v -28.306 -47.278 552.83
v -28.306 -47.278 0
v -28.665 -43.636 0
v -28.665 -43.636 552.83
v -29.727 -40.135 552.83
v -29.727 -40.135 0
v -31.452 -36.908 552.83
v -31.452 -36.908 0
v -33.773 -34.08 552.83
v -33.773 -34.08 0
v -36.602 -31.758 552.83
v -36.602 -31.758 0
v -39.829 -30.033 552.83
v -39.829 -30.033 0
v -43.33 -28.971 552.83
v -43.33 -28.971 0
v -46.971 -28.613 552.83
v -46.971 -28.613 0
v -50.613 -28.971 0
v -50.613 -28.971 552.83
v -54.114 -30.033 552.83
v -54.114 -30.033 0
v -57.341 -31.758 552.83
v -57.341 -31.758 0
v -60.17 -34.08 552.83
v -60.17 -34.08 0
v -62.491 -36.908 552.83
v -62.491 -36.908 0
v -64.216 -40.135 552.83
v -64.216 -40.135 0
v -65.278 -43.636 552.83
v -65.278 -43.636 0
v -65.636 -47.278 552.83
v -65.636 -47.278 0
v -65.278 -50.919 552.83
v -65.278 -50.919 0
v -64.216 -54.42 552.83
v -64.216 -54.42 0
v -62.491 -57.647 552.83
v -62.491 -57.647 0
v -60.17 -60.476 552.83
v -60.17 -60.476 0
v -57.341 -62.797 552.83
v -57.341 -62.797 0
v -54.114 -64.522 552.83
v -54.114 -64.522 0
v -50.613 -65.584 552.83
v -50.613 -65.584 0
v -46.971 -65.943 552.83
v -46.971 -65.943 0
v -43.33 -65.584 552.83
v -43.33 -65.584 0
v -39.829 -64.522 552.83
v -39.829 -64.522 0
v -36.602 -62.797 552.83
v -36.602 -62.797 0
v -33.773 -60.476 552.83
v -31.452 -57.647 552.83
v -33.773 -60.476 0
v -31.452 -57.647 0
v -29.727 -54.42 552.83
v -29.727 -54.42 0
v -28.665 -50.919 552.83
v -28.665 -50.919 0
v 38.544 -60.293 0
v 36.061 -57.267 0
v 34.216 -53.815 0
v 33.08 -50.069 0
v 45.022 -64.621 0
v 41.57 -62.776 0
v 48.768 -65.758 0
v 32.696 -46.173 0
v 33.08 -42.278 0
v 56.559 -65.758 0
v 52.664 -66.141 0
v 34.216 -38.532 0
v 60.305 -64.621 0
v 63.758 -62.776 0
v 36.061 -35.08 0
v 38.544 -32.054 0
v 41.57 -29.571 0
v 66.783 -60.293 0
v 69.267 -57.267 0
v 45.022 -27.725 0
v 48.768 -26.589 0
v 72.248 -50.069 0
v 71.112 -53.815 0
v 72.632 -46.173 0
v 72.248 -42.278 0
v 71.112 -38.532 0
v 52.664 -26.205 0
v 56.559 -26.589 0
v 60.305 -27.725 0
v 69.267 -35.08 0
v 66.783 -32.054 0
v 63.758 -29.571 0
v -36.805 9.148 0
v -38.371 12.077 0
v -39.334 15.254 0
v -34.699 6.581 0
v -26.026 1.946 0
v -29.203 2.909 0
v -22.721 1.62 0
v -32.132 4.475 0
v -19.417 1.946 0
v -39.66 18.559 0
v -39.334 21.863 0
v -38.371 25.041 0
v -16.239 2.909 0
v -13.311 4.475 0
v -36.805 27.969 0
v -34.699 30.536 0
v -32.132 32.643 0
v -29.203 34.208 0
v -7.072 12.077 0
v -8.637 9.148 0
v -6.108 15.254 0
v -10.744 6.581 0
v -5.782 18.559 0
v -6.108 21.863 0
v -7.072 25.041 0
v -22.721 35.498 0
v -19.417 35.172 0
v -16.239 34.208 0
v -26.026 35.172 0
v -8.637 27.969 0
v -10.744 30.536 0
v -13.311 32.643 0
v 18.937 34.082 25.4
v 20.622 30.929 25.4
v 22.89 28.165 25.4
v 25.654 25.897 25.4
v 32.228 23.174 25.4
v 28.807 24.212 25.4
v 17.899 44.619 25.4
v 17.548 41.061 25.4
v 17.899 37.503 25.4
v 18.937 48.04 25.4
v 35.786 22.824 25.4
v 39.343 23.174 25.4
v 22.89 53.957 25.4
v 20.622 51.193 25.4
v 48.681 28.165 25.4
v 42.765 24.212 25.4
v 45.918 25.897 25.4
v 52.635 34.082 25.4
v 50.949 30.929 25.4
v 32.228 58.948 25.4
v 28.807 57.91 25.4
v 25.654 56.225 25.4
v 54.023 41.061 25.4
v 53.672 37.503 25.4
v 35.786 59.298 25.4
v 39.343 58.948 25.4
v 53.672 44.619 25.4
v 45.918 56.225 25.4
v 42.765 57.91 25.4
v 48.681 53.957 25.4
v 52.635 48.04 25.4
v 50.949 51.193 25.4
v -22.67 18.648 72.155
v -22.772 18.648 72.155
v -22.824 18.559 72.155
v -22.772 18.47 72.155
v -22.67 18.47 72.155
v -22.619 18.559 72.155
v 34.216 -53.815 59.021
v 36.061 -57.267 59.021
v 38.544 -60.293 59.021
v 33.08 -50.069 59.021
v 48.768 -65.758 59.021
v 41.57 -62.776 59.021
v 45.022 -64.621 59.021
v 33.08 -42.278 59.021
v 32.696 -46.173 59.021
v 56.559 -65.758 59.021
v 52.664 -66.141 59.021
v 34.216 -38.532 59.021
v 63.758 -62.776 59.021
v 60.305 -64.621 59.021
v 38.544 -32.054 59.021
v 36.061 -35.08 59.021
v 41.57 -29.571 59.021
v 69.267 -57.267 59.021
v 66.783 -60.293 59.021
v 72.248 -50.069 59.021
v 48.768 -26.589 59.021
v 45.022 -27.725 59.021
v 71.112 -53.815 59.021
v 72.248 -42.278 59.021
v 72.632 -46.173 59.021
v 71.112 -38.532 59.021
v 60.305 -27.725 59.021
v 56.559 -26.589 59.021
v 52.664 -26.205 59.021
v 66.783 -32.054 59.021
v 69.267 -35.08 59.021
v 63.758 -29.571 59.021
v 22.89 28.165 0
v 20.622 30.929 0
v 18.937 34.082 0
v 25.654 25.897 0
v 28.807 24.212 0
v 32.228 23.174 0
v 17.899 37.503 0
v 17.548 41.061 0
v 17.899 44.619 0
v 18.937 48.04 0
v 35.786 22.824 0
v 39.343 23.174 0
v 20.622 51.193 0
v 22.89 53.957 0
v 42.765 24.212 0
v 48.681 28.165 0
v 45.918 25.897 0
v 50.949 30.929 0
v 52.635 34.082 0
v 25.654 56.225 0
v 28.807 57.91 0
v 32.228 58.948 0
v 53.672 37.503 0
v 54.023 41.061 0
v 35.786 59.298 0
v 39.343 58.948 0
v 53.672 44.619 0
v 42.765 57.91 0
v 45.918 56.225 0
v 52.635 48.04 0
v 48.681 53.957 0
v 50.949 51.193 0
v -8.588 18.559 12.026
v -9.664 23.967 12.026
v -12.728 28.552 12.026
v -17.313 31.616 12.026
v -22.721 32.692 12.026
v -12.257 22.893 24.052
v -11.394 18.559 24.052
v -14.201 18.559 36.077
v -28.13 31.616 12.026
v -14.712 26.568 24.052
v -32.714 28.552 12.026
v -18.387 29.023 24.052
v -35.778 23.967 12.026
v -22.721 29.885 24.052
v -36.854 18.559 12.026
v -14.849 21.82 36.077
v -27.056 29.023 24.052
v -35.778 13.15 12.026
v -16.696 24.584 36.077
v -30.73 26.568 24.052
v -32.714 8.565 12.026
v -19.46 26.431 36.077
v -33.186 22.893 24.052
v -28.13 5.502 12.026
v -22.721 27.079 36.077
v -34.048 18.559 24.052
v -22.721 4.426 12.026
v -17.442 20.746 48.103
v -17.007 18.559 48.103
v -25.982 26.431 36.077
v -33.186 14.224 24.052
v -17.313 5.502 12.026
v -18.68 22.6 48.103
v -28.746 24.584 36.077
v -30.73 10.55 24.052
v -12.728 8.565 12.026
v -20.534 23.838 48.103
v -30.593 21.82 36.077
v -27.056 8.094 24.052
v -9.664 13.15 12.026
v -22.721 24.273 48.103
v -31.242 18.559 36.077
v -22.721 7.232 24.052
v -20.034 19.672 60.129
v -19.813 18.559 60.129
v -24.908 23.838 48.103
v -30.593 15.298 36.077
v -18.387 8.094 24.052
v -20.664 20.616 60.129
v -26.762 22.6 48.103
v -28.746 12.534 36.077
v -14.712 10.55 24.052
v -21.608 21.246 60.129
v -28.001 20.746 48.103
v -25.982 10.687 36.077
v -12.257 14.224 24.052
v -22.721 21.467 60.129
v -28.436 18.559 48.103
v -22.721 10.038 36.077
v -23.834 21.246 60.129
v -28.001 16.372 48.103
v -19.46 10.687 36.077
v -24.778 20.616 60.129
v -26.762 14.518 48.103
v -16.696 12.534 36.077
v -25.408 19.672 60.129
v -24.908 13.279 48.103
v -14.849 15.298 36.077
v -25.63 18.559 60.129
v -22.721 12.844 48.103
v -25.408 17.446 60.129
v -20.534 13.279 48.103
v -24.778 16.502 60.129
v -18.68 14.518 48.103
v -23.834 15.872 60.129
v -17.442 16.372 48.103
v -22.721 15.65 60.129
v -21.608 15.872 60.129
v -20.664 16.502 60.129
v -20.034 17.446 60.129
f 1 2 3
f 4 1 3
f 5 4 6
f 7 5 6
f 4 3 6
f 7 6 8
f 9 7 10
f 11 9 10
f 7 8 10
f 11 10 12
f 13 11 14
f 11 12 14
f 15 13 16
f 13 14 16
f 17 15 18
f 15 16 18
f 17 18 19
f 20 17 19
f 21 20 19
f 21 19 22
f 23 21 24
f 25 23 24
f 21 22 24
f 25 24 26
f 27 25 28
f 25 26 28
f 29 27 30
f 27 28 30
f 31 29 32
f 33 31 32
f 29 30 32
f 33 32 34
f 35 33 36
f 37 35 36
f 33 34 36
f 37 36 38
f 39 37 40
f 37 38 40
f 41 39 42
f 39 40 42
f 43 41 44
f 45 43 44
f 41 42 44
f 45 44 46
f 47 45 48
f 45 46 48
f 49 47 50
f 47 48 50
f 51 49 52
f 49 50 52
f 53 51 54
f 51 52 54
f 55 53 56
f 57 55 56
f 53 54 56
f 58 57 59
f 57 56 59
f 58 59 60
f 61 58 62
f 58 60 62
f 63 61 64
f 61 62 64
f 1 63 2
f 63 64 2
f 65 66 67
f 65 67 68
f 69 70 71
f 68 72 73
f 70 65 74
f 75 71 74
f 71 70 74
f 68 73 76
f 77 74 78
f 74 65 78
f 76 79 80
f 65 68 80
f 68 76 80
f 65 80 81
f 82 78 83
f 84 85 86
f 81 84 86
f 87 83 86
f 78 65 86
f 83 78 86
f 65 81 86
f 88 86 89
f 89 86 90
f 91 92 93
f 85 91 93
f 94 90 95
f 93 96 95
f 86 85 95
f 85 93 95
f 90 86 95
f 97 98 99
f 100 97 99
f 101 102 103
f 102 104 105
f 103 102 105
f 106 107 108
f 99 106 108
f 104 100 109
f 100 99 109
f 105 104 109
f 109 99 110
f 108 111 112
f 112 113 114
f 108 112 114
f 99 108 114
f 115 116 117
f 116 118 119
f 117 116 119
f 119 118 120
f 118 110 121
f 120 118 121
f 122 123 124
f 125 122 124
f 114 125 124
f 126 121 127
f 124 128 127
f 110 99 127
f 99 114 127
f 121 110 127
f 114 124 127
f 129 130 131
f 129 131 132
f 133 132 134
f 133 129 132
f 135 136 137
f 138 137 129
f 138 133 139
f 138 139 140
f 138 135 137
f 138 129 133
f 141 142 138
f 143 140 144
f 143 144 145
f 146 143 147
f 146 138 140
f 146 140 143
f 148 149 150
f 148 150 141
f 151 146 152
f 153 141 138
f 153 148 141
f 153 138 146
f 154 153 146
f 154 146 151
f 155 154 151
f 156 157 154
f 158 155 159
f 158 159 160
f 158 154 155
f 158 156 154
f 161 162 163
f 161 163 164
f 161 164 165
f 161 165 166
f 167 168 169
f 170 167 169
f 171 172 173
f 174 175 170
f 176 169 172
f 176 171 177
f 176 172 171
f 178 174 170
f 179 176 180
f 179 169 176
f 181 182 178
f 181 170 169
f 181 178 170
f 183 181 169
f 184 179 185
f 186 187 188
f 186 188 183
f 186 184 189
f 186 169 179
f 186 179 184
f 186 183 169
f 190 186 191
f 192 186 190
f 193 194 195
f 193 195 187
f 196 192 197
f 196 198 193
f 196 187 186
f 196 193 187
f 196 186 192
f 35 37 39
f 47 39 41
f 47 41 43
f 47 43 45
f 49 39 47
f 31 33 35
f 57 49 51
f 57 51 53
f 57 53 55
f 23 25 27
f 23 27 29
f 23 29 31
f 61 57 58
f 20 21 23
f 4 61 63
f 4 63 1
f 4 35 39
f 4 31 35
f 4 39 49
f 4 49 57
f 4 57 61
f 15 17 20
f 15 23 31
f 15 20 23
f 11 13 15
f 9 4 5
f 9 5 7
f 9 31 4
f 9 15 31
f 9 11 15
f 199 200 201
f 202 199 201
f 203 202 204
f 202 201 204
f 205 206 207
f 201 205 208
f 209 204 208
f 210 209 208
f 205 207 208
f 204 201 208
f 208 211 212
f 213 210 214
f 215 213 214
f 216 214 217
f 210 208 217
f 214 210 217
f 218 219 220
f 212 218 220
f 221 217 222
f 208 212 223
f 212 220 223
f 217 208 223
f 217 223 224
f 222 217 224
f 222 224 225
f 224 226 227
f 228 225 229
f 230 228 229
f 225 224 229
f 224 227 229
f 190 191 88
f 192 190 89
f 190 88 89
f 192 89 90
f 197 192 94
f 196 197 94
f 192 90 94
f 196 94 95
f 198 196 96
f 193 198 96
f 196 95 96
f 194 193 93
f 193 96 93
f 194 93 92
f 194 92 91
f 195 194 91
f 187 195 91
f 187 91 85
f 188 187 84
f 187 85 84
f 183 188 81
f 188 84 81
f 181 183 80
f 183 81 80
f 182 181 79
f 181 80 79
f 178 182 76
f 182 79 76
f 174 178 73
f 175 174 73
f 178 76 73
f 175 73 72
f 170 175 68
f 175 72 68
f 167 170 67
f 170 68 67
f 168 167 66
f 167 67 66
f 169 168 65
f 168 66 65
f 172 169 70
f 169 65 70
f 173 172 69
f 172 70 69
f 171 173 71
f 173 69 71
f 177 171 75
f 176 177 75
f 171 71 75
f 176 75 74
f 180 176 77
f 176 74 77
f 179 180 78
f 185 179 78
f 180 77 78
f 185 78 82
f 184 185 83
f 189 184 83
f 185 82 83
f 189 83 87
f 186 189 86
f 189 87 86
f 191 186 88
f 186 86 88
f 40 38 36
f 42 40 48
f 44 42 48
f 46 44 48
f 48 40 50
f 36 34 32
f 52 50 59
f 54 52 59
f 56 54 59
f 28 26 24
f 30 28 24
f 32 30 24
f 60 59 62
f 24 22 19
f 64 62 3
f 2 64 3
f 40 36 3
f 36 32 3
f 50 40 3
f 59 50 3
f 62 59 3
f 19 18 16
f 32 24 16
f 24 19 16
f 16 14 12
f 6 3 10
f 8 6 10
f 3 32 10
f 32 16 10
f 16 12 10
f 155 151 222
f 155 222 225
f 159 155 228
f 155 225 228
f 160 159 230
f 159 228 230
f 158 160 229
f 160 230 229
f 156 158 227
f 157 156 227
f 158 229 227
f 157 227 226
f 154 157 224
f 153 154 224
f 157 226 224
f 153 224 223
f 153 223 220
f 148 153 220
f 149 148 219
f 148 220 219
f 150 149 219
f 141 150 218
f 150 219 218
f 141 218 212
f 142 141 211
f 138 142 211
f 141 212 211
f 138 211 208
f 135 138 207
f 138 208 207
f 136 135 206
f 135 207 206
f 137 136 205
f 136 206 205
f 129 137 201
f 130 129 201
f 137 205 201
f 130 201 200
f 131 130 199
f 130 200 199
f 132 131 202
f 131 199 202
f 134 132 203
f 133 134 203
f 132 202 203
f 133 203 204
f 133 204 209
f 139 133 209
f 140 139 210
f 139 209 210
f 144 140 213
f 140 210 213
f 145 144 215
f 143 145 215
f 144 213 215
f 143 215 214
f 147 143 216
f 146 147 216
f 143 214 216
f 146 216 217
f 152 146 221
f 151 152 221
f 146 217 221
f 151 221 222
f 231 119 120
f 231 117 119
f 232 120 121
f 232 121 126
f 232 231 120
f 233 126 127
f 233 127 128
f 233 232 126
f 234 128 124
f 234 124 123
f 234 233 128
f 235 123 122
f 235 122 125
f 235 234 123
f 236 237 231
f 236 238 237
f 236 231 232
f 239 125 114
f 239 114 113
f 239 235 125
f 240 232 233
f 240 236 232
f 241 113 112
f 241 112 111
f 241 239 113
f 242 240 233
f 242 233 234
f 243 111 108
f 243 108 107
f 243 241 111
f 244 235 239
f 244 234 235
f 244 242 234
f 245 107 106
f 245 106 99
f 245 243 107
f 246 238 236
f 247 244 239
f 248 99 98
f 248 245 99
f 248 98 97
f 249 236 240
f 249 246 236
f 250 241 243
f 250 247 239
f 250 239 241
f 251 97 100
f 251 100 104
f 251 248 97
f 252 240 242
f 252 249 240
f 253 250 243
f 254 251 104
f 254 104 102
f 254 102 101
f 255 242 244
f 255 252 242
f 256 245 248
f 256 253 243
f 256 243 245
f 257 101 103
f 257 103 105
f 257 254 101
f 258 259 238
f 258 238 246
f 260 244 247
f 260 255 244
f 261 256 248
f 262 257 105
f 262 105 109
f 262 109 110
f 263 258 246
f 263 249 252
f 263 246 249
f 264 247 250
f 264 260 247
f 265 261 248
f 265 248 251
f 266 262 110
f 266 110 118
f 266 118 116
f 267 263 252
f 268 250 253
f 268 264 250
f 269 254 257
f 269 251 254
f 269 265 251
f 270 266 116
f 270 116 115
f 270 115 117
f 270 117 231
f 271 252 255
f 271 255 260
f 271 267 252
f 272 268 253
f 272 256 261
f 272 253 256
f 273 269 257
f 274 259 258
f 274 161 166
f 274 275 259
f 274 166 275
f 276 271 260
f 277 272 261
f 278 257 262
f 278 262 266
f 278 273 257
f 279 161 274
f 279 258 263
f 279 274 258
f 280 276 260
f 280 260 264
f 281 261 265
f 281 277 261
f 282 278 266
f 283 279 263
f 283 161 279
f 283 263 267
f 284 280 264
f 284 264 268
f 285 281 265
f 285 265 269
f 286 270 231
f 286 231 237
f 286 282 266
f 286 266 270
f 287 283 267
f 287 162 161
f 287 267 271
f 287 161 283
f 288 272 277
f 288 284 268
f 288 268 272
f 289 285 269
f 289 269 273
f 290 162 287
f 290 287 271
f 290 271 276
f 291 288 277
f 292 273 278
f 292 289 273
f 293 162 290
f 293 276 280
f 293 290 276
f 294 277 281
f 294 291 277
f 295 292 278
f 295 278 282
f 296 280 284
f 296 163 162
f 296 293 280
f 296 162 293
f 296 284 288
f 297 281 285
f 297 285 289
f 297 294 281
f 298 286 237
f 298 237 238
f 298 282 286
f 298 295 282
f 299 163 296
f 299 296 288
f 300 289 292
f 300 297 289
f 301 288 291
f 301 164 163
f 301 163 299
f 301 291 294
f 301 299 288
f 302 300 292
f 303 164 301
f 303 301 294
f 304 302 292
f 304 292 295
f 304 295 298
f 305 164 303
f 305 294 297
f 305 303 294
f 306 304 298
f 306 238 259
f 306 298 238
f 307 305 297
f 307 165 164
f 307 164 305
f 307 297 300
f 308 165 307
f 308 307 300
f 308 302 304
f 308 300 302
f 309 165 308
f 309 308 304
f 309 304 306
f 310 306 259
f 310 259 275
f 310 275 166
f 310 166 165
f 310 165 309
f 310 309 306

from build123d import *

# Parameters (mm, degrees)
F0_R     = 19.9680226168
F1_DEPTH = 59.0213239193
F2_R     = 18.2371893678
F3_DEPTH = 25.4
F6_R     = 18.6649469358
F7_DEPTH = 552.8296232224
F8_R     = 17.8826234865
F9_DEPTH = 72.1546784043


# Not quite as in the source:
# - a fillet or chamfer that OpenCascade refuses, or shapes differently, is made with other operations: its cross-section is extruded or revolved along the edge and cut away or added
# - the program builds the solid bodies; features that only make, move or delete a surface that nothing else refers to are left out


with BuildPart() as f1:
    # F0 (on Top) → F1 (new body)
    with BuildSketch(Plane.XY):
        with Locations((52.6638887823, -46.1734086275)):
            Circle(F0_R)
    extrude(amount=F1_DEPTH)


with BuildPart() as f3:
    # F2 (on Top) → F3 (new body)
    with BuildSketch(Plane.XY):
        with Locations((35.7855930924, 41.0611107945)):
            Circle(F2_R)
    extrude(amount=F3_DEPTH)


with BuildPart() as f7:
    # F6 (on Top) → F7 (new body)
    with BuildSketch(Plane.XY):
        with Locations((-46.9713956118, -47.2776144743)):
            Circle(F6_R)
    extrude(amount=F7_DEPTH)


with BuildPart() as f9:
    # F8 (on Top) → F9 (new body)
    with BuildSketch(Plane.XY):
        with Locations((-22.7211695164, 18.5588113964)):
            Circle(F8_R)
    extrude(amount=F9_DEPTH)

    # F10: chamfer of 17.78 x 76.2 on 1 edges, made by hand

    # F10_s1 → F10_t2 (revolve, cut)
    with BuildSketch(Plane.XZ.offset(-18.5588113964)):
        Polygon((-4.8385460299, -4.0453215957), (-22.6185460299, 72.1546784043), (-4.8385460299, 72.1546784043), align=None)
    revolve(axis=Axis((-22.7211695164, 18.5588113964, 72.1546784043), (0, 0, 1)), mode=Mode.SUBTRACT)


solid = Compound([f1.part, f3.part, f7.part, f9.part])
